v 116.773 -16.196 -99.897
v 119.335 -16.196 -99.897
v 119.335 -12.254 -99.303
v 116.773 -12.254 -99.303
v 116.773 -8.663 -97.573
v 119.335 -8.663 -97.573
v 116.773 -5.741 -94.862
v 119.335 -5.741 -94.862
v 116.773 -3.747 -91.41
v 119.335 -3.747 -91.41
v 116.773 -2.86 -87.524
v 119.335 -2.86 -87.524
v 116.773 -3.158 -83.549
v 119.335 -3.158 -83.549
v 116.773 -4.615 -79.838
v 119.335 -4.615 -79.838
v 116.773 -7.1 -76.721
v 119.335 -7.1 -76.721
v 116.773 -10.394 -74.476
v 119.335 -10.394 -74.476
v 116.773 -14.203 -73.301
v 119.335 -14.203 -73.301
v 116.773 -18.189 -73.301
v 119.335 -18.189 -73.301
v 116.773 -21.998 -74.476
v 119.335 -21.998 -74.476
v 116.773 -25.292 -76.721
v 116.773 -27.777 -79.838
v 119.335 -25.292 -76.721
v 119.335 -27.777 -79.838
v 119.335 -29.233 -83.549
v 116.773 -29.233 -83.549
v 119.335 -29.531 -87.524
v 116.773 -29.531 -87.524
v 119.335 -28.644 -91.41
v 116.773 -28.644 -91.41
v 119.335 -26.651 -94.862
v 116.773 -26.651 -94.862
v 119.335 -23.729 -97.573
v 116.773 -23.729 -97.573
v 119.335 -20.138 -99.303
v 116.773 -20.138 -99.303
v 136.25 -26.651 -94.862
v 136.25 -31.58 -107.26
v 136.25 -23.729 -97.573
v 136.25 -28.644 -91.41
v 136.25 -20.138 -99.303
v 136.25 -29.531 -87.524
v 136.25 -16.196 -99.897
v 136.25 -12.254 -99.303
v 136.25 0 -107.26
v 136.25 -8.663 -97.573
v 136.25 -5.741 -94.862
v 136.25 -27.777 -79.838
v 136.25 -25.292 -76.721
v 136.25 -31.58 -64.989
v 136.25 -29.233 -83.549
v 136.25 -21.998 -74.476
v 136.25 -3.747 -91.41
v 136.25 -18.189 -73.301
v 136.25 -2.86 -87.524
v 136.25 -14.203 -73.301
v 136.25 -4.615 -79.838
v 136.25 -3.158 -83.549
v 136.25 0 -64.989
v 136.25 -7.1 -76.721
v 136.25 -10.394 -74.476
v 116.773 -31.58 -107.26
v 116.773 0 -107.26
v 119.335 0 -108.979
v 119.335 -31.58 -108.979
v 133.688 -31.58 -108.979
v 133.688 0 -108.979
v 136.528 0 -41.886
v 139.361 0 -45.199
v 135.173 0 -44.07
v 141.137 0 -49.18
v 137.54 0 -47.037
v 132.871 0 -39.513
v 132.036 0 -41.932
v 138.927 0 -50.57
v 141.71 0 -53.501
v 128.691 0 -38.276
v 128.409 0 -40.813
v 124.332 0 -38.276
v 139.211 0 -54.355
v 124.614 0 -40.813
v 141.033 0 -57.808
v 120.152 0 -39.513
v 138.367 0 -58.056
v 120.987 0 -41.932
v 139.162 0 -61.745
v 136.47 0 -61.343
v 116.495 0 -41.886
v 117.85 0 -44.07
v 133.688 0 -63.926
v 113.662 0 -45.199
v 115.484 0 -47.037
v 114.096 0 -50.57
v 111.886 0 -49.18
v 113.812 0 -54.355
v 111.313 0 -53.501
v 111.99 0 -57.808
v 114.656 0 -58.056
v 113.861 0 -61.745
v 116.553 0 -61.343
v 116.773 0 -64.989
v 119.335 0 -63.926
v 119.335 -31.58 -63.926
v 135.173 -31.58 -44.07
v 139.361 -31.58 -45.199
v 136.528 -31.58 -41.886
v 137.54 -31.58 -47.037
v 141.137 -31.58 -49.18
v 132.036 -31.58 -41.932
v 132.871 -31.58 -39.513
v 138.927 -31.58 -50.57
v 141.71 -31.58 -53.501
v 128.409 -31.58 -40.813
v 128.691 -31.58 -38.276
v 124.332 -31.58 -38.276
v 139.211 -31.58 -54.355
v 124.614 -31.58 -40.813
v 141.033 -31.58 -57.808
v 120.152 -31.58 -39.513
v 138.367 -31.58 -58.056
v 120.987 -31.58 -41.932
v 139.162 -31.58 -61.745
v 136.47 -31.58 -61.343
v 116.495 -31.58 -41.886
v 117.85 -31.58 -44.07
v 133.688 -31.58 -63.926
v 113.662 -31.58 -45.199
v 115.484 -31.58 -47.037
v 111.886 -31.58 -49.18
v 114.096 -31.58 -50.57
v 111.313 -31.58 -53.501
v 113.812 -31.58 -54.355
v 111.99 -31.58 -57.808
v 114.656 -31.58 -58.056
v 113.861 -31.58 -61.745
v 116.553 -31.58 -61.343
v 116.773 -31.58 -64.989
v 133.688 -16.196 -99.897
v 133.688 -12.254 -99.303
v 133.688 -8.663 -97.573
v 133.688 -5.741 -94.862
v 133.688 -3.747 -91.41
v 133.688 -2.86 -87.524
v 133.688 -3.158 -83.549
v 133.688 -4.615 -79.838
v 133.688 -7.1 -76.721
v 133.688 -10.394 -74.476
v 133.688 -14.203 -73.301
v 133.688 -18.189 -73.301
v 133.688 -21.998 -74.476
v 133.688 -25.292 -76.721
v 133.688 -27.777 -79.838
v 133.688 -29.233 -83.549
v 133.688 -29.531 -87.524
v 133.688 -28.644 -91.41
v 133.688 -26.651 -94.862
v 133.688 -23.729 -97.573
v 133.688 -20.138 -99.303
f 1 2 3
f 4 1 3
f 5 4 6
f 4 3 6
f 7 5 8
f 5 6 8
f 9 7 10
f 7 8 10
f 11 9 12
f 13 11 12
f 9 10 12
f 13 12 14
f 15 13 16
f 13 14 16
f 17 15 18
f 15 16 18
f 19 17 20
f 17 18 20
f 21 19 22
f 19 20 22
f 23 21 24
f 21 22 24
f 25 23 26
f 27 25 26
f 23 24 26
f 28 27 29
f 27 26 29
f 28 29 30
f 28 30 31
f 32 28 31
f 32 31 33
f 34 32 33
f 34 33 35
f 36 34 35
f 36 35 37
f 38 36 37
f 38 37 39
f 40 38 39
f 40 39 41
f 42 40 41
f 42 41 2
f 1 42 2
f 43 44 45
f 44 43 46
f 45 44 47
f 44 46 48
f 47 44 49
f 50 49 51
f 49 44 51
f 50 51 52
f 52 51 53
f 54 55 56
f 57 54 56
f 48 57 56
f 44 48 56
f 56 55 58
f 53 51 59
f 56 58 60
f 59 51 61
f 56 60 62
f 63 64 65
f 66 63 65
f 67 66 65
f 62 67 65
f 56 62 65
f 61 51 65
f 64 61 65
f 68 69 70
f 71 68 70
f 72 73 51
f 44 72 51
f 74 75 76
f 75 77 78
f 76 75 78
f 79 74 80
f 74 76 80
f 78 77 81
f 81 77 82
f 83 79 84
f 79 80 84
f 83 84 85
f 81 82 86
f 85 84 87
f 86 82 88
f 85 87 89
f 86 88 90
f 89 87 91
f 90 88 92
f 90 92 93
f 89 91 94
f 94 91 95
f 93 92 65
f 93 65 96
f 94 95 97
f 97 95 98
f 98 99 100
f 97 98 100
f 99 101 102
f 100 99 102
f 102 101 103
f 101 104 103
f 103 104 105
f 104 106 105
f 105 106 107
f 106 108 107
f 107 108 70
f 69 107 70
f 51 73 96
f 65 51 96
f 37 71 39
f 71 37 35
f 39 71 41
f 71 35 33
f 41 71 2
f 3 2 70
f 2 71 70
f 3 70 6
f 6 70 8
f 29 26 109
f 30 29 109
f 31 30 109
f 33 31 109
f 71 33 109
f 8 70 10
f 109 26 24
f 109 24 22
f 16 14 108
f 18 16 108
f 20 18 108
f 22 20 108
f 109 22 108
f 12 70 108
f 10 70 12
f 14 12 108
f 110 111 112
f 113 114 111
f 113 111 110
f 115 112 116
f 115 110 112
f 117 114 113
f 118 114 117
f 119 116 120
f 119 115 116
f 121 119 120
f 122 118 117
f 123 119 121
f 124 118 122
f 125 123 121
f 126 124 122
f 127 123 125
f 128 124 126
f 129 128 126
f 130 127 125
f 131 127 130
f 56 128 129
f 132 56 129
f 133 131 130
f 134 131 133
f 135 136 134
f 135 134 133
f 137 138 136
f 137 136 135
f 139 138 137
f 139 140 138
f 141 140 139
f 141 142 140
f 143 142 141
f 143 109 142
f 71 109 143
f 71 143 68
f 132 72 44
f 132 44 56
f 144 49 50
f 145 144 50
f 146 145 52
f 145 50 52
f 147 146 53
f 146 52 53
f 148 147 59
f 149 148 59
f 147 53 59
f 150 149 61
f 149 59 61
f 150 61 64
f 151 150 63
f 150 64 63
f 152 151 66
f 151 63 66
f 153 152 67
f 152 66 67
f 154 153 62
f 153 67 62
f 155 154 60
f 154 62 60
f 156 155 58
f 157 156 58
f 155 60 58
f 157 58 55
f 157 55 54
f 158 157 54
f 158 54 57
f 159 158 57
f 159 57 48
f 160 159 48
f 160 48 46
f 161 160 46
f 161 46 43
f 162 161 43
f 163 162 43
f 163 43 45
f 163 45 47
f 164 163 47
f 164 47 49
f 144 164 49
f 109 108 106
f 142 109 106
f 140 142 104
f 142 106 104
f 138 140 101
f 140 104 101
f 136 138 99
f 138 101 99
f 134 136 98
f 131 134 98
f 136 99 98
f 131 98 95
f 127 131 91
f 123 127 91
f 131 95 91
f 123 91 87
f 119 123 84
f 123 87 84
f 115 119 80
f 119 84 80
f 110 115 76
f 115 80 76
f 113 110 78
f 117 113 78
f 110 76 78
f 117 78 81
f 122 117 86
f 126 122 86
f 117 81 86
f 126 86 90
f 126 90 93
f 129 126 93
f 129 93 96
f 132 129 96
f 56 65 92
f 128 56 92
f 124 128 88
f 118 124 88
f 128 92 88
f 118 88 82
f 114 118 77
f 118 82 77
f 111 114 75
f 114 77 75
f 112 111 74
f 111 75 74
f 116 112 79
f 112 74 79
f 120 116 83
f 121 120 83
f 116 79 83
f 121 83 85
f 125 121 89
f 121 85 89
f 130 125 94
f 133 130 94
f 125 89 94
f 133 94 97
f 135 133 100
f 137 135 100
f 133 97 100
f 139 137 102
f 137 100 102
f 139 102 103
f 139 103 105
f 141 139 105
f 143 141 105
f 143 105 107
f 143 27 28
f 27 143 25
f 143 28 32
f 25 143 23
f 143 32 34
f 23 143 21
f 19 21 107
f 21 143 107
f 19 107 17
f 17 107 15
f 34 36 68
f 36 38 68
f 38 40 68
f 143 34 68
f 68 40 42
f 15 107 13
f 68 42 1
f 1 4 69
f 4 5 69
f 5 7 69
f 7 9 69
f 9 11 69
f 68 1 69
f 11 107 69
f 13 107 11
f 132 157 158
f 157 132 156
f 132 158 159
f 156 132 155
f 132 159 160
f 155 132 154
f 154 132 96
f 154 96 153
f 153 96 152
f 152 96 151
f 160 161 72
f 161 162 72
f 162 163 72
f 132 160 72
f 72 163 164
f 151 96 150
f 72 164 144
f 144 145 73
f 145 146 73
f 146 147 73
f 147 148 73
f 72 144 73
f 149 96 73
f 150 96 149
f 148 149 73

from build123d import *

# Parameters (mm, degrees)
BOSS_EXTRUDE1_DEPTH = 31.57982
SKETCH2_R           = 13.372801857
CUT_EXTRUDE1_DEPTH  = 117.170888451


with BuildPart() as part:
    # Sketch1 → Boss-Extrude1 (new body)
    with BuildSketch(Plane(origin=(0, 0, 0), x_dir=(1, 0, 0), z_dir=(0, 1, 0))):
        with BuildLine():
            Line((136.250172, 107.259882), (136.250172, 64.988694))
            ThreePointArc((136.250172, 64.988694), (126.511558, 38.118796), (116.772944, 64.988694))
            Line((116.772944, 64.988694), (116.772944, 107.259882))
            Line((116.772944, 107.259882), (119.334788, 108.979208))
            Line((119.334788, 108.979208), (119.334788, 63.925704))
            ThreePointArc((119.334788, 63.925704), (126.511558, 40.670734), (133.688328, 63.925704))
            Line((133.688328, 63.925704), (133.688328, 108.979208))
            Line((133.688328, 108.979208), (136.250172, 107.259882))
        make_face()
    extrude(amount=-BOSS_EXTRUDE1_DEPTH)

    # Sketch2 → Cut-Extrude1 (cut, through all)
    with BuildSketch(Plane(origin=(136.250172, 0, 0), x_dir=(0, 0, -1), z_dir=(1, 0, 0))):
        with Locations((86.524338, -16.195802)):
            Circle(SKETCH2_R)
    extrude(amount=-CUT_EXTRUDE1_DEPTH, mode=Mode.SUBTRACT)


solid = part.part
